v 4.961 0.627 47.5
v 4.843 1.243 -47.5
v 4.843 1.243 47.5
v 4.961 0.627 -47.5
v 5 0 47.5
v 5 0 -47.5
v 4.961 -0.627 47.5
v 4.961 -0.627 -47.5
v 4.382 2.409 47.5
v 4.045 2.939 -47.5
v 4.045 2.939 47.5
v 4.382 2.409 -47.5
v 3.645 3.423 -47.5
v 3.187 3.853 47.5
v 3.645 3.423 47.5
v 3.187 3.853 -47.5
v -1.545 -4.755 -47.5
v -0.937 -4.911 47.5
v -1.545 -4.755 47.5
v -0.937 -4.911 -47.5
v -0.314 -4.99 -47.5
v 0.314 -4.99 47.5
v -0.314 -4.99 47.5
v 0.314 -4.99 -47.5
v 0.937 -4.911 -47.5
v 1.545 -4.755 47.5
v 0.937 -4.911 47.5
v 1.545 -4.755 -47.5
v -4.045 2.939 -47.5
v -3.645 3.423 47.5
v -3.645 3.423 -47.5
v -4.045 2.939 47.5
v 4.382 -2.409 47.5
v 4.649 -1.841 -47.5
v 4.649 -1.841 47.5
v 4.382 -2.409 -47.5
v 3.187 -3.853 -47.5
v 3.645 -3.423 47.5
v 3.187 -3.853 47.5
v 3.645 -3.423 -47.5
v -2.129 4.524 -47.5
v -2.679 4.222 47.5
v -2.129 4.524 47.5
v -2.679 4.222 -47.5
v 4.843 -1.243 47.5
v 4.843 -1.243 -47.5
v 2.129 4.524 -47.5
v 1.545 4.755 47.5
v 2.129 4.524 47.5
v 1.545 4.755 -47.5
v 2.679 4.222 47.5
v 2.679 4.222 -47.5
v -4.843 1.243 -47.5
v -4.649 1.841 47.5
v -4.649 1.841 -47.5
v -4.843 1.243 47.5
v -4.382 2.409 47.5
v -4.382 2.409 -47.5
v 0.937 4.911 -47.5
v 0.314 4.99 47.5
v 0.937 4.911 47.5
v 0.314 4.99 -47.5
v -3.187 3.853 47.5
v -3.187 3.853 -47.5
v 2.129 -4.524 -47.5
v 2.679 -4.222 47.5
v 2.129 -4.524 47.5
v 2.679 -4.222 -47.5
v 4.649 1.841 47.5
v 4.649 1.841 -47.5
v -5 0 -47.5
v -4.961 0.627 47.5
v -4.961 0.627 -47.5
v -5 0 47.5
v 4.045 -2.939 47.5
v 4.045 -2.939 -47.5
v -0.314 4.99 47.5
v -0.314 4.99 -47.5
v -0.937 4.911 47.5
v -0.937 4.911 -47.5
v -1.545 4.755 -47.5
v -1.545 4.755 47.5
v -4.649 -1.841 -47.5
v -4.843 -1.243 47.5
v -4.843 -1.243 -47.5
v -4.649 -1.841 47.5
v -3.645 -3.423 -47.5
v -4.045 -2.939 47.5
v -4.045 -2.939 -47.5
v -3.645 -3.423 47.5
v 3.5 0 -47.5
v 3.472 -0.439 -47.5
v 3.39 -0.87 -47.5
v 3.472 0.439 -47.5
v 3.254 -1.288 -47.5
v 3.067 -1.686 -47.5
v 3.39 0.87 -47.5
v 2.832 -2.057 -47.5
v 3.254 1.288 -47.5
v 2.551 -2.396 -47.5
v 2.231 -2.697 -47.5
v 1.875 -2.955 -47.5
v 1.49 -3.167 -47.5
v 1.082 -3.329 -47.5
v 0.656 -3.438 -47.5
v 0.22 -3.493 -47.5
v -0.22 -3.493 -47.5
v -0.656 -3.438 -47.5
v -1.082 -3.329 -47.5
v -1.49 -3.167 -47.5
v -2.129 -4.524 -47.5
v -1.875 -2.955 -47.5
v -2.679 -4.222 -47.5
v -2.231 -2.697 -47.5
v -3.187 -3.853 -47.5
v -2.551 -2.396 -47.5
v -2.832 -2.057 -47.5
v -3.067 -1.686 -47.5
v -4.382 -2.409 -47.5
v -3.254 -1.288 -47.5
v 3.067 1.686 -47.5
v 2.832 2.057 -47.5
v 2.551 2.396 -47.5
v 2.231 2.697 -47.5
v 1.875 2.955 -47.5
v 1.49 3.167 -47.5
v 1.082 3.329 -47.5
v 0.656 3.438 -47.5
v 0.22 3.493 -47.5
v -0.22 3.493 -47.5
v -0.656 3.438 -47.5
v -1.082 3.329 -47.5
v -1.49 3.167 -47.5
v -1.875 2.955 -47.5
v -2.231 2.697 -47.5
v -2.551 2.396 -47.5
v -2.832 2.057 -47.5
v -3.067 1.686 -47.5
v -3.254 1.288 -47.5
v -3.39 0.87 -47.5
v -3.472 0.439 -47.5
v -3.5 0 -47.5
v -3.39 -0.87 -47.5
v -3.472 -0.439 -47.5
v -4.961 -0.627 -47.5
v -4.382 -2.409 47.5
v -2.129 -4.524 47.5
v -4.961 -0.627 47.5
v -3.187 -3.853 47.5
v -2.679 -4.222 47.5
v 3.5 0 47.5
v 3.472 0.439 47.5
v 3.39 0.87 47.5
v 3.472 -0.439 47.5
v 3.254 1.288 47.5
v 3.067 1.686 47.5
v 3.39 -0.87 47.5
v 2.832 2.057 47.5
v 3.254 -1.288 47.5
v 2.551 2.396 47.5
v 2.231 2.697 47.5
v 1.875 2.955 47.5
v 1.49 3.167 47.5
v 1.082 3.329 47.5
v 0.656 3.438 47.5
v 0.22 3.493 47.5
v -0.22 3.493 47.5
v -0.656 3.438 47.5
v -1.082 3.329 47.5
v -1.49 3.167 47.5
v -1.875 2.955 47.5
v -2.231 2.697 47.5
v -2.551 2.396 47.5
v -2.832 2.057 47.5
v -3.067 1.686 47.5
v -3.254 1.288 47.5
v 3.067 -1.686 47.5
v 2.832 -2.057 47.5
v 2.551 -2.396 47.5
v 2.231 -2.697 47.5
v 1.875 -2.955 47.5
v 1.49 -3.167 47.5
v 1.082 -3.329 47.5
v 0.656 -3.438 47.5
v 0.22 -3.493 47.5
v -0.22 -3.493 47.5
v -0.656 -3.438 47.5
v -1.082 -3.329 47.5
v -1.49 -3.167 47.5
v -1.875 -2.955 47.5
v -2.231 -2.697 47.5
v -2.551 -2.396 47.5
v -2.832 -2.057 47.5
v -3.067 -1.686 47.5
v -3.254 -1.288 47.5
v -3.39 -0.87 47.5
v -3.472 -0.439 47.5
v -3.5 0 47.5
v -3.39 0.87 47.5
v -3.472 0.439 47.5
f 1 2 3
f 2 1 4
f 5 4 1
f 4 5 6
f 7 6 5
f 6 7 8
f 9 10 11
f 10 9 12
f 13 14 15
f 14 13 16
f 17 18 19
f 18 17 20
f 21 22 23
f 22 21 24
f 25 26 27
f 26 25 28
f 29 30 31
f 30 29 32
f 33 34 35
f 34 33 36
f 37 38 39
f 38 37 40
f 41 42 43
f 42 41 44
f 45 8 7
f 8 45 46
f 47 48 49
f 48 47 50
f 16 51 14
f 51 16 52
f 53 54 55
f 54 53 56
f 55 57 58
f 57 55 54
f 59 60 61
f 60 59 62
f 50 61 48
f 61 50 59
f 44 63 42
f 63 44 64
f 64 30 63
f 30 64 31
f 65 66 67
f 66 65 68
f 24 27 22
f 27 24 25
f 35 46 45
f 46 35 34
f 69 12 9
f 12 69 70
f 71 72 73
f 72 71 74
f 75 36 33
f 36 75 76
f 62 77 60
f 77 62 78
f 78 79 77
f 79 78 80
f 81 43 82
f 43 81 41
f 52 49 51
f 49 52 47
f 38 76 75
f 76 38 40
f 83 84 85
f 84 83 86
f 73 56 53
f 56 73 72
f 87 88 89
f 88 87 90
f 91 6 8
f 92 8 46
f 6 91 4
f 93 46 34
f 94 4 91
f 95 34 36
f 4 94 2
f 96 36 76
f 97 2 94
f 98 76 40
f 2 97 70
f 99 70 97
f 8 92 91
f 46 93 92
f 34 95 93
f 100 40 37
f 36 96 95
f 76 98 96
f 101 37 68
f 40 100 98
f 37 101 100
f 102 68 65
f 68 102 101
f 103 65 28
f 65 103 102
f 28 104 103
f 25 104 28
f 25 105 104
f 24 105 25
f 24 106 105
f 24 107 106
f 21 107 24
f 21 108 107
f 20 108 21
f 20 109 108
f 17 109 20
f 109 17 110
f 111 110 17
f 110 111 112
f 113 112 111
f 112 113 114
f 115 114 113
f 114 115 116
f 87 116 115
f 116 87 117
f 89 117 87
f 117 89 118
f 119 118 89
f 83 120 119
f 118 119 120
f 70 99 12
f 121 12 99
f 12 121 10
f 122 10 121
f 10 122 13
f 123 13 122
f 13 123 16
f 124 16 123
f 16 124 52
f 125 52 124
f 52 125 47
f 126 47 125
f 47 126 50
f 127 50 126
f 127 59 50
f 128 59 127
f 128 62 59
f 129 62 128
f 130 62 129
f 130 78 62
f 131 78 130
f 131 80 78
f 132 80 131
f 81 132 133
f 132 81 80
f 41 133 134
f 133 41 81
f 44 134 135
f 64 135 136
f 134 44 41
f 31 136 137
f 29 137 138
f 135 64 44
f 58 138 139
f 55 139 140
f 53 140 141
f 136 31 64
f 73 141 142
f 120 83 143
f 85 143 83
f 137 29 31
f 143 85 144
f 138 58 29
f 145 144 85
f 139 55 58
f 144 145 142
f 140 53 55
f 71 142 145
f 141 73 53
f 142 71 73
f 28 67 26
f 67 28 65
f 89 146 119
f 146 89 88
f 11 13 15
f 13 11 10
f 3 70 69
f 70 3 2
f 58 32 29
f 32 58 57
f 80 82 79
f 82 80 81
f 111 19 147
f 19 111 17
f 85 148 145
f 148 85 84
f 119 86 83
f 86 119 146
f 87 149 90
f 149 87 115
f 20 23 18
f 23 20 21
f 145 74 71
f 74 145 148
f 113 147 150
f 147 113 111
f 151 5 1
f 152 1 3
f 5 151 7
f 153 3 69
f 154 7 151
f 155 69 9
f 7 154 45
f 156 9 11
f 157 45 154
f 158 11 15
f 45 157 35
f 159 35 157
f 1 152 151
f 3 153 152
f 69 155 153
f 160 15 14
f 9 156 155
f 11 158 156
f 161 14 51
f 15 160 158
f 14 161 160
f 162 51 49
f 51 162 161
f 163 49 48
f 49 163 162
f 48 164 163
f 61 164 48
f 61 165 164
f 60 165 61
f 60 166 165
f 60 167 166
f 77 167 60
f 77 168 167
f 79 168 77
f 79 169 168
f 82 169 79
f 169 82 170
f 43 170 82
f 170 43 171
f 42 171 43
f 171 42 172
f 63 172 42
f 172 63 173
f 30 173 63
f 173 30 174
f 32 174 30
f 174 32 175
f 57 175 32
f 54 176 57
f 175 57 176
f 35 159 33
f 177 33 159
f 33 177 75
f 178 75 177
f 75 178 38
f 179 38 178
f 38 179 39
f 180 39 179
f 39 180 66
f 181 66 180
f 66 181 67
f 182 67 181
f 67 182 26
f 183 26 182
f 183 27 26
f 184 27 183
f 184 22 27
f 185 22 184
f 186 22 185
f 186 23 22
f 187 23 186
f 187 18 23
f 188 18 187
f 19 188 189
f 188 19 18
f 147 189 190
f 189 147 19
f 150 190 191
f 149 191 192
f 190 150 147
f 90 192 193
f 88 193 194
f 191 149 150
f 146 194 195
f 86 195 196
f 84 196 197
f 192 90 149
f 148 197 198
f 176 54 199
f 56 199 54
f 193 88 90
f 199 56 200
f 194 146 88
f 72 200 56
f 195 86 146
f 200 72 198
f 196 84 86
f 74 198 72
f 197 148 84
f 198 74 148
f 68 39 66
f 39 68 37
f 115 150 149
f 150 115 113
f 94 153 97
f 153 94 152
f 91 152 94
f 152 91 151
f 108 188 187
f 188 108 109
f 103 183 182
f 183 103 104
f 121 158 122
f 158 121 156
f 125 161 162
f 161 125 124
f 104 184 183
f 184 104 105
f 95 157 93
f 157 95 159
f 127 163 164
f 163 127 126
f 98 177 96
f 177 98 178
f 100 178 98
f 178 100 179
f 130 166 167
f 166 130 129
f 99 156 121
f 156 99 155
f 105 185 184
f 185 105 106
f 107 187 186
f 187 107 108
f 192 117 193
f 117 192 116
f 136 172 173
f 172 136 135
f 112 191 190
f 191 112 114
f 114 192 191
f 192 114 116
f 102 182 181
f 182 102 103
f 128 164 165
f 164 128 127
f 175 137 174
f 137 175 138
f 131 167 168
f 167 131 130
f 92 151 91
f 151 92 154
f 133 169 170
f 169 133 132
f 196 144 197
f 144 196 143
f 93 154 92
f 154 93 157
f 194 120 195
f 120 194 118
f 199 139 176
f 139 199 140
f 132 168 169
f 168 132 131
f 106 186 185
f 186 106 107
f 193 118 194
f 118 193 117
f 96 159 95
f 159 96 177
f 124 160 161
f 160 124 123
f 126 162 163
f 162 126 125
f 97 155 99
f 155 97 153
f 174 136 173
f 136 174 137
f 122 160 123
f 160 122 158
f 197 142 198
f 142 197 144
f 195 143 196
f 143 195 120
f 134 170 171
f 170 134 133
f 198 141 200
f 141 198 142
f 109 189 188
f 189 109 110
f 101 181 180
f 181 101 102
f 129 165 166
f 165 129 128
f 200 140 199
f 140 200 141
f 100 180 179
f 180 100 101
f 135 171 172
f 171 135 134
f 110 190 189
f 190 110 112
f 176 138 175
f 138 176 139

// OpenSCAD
$fn = 50;


difference() {
	union() {
		translate(v = [0, 0, -47.5000000000]) {
			cylinder(h = 95, r = 5.0000000000);
		}
	}
	union() {
		translate(v = [0, 0, -100.0000000000]) {
			cylinder(h = 200, r = 3.5000000000);
		}
	}
}
